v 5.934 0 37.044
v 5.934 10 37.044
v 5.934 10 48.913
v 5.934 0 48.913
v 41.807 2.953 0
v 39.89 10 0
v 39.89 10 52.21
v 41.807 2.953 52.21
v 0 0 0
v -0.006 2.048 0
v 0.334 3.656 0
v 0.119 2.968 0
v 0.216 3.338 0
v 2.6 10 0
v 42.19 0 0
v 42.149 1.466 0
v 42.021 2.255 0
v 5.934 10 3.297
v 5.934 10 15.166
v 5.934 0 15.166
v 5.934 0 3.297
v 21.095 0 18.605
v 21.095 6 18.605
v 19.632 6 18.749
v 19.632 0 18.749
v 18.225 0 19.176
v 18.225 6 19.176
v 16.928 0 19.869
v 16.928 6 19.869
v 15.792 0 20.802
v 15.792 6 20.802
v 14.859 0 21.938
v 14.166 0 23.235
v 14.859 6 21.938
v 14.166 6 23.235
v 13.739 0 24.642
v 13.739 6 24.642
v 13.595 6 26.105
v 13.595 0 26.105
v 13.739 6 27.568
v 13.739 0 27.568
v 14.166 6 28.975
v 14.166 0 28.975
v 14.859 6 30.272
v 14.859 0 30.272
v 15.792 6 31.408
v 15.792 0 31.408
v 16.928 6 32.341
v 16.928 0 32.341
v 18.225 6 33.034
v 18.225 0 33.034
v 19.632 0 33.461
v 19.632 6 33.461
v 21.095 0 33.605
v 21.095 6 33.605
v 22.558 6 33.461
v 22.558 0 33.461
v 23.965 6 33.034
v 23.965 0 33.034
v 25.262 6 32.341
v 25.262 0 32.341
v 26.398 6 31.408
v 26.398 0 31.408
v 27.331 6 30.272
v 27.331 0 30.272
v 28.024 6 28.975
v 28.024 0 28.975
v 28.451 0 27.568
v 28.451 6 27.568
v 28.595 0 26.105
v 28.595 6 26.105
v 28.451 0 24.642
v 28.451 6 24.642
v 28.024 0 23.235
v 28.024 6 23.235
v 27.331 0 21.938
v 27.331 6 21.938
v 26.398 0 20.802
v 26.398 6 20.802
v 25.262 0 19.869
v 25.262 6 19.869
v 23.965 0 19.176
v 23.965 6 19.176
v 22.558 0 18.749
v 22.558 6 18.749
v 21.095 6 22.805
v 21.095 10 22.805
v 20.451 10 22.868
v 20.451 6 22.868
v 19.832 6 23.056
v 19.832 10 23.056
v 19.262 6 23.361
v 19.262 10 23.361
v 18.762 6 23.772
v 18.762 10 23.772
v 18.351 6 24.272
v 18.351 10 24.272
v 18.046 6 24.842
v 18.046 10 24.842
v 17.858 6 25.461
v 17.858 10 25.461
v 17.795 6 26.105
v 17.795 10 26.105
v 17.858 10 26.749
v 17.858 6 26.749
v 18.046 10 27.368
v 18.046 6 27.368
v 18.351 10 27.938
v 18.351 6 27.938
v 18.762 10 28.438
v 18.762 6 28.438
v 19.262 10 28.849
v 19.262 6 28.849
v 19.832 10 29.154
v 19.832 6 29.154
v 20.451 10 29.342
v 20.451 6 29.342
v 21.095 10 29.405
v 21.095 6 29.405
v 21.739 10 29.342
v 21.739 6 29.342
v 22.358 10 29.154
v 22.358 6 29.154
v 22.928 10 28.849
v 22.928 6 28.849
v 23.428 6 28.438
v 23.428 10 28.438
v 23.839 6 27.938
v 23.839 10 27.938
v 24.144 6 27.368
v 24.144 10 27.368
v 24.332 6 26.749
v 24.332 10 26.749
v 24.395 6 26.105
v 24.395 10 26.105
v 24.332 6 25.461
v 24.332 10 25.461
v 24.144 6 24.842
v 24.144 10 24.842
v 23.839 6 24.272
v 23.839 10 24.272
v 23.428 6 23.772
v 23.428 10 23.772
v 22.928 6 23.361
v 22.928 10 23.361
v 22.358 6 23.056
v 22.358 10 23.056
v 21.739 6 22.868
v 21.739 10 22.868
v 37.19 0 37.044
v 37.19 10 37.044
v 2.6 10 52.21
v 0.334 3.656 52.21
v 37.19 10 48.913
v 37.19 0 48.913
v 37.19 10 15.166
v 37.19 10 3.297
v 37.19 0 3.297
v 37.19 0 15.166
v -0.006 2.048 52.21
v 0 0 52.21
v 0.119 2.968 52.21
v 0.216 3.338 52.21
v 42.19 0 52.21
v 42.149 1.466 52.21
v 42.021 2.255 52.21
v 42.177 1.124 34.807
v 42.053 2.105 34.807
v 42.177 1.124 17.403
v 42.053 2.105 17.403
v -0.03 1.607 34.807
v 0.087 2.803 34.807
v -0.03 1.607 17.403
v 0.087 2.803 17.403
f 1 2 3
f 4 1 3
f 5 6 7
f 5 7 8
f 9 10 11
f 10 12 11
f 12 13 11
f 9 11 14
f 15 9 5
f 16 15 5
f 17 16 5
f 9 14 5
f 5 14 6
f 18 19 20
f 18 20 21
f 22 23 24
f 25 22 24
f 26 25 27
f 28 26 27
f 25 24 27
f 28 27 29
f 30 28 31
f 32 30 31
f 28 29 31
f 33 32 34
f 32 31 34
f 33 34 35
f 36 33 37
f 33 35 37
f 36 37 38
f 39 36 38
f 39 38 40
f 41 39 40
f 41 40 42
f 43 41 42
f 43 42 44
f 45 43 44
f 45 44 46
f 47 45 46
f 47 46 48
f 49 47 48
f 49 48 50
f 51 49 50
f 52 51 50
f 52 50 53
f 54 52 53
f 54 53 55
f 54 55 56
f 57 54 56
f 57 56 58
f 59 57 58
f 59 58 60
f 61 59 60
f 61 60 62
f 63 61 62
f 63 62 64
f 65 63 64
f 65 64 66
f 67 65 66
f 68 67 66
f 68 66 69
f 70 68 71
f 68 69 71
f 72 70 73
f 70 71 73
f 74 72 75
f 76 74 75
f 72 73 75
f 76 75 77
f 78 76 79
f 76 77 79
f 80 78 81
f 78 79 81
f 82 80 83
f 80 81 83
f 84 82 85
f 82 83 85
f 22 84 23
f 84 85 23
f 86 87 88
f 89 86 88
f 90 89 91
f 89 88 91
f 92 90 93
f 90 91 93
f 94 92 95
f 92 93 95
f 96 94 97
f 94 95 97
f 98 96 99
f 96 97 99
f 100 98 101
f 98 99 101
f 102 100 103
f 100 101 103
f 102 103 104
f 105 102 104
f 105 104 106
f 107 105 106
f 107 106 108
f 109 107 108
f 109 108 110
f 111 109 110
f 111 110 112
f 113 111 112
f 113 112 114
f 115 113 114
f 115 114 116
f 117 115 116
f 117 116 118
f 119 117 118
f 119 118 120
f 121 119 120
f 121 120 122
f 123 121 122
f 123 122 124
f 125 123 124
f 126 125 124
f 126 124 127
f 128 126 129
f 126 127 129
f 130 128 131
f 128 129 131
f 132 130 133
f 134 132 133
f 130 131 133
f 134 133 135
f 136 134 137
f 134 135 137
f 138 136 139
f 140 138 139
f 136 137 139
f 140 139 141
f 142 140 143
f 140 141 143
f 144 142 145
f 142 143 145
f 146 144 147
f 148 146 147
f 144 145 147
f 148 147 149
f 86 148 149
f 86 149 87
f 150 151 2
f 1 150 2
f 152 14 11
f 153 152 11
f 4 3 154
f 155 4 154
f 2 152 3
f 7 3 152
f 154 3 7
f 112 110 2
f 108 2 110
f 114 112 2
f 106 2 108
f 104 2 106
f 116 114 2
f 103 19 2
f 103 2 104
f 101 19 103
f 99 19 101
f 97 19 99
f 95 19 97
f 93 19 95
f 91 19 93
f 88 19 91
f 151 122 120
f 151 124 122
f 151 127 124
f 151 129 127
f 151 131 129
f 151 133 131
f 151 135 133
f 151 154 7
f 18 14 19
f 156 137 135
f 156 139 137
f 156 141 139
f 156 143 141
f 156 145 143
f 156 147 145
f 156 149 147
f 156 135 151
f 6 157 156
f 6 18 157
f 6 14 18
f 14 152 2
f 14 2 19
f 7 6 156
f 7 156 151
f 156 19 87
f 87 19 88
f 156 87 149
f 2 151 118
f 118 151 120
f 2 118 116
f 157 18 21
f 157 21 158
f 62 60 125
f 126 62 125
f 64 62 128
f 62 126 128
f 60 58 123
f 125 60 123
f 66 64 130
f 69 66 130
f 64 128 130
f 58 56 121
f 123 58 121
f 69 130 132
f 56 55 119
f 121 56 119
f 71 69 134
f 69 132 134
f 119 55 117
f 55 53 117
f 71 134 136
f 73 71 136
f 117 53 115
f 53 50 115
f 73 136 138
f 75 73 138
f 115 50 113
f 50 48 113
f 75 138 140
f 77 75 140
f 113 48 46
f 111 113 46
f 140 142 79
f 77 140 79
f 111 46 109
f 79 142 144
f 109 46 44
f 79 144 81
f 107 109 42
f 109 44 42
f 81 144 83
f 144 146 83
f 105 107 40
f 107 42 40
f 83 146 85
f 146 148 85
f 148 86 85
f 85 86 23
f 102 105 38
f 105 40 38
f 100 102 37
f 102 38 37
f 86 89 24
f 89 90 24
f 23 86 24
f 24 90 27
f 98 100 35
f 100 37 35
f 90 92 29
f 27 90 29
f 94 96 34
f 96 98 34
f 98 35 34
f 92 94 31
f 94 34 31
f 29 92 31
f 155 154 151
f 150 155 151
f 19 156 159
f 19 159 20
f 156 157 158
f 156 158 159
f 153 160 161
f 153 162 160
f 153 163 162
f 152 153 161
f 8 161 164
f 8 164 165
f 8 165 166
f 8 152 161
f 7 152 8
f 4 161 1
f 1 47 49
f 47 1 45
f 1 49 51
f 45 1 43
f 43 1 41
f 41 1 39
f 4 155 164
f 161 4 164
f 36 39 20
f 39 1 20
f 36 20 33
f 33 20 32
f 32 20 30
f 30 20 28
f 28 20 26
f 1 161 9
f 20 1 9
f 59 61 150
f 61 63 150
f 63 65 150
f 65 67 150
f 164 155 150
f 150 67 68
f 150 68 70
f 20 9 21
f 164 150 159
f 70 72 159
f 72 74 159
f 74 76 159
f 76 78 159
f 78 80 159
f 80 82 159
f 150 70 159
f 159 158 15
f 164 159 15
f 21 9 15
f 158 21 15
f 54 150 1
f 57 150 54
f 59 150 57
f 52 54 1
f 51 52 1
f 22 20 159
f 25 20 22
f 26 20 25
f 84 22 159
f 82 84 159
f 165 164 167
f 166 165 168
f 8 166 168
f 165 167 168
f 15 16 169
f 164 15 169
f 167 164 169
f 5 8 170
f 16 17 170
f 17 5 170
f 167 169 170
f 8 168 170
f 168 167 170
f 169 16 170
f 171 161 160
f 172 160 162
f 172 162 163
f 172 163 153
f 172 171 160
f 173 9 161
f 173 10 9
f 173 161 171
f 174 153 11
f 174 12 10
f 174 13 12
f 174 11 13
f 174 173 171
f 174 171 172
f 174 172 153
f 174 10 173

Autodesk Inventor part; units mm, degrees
sketch "Skizze1" plane through (0, 0, 0) normal (0, 0, 1) x (1, 0, 0)
  line L0 (0, 0) -> (42.19, 0)
  line L1 (2.6, 0) -> (2.6, 10)
  line L2 (39.89, 0) -> (39.89, 10)
  line L3 (2.6, 10) -> (39.89, 10)
  line L4 (0, 0) -> (-0.1073, 1.8337) construction
  spline S0 degree 3 poles (0, 0) (-0.1073, 1.8337) (0.0261, 2.9533) (0.334, 3.6563) knots 1 1 1 1 1.405888 1.405888 1.405888 1.405888
  line L5 (42.19, 0) -> (42.2285, 1.1988) construction
  spline S1 degree 3 poles (42.19, 0) (42.2285, 1.1988) (42.1183, 2.1671) (41.8072, 2.9533) knots 1 1 1 1 1.467938 1.467938 1.467938 1.467938
  line L6 (2.6, 10) -> (0.334, 3.6563)
  line L7 (-0.1073, 1.8337) -> (0.0261, 2.9533) construction
  line L8 (0.0261, 2.9533) -> (0.334, 3.6563) construction
  line L9 (39.89, 10) -> (41.8072, 2.9533)
  line L10 (42.2285, 1.1988) -> (42.1183, 2.1671) construction
  line L11 (42.1183, 2.1671) -> (41.8072, 2.9533) construction
  point P0 (39.89, 5)
  point P1 (2.6, 5)
  dimension "d0" = 42.19
  dimension "d1" = 2.6
  dimension "d2" = 10
  dimension "d3" = 2.3
extrude "Extrusion1" add sketch "Skizze1" along normal blind 52.21
sketch "Skizze3" plane through (0, 0, 0) normal (0, -1, 0) x (1, 0, 0)
  line L0 (0, 0) -> (42.19, 0) projected
  line L1 (0, 52.21) -> (42.19, 52.21) projected
  line L2 (42.19, 0) -> (42.19, 52.21) projected
  line L3 (0, 0) -> (0, 52.21) projected
  point P0 (21.095, 26.105)
hole "Bohrung2" at (21.095, 0, 26.105) direction (0, 1, 0) diameter 6.6 depth 10 counterbore diameter 15 counterbore depth 6
sketch "Skizze4" plane through (2.6, 10, 0) normal (0, 1, 0) x (1, 0, 0)
  line L0 (3.3345, -3.2969) -> (34.5895, -3.2969)
  line L1 (34.5895, -3.2969) -> (34.5895, -15.1659)
  line L2 (34.5895, -15.1659) -> (3.3345, -15.1659)
  line L3 (3.3345, -15.1659) -> (3.3345, -3.2969)
  circle A0 centre (18.495, -26.105) radius 3.3 projected
  line L4 (37.29, 0) -> (0, 0) projected
  line L5 (0, 0) -> (0, -52.21) projected
  line L6 (37.29, -52.21) -> (0, -52.21) projected
  line L7 (37.29, 0) -> (37.29, -52.21) projected
  line L8 (18.495, -26.105) -> (-9.8533, -26.105)
  line L9 (3.3345, -48.9131) -> (34.5895, -48.9131)
  line L10 (34.5895, -48.9131) -> (34.5895, -37.0441)
  line L11 (34.5895, -37.0441) -> (3.3345, -37.0441)
  line L12 (3.3345, -37.0441) -> (3.3345, -48.9131)
  point P0 (-2.6, 0)
extrude "Extrusion2" cut sketch "Skizze4" against normal through all contours L0 L1 L2 L3 | L12 L11 L10 L9
properties part number "tripodInlay"
